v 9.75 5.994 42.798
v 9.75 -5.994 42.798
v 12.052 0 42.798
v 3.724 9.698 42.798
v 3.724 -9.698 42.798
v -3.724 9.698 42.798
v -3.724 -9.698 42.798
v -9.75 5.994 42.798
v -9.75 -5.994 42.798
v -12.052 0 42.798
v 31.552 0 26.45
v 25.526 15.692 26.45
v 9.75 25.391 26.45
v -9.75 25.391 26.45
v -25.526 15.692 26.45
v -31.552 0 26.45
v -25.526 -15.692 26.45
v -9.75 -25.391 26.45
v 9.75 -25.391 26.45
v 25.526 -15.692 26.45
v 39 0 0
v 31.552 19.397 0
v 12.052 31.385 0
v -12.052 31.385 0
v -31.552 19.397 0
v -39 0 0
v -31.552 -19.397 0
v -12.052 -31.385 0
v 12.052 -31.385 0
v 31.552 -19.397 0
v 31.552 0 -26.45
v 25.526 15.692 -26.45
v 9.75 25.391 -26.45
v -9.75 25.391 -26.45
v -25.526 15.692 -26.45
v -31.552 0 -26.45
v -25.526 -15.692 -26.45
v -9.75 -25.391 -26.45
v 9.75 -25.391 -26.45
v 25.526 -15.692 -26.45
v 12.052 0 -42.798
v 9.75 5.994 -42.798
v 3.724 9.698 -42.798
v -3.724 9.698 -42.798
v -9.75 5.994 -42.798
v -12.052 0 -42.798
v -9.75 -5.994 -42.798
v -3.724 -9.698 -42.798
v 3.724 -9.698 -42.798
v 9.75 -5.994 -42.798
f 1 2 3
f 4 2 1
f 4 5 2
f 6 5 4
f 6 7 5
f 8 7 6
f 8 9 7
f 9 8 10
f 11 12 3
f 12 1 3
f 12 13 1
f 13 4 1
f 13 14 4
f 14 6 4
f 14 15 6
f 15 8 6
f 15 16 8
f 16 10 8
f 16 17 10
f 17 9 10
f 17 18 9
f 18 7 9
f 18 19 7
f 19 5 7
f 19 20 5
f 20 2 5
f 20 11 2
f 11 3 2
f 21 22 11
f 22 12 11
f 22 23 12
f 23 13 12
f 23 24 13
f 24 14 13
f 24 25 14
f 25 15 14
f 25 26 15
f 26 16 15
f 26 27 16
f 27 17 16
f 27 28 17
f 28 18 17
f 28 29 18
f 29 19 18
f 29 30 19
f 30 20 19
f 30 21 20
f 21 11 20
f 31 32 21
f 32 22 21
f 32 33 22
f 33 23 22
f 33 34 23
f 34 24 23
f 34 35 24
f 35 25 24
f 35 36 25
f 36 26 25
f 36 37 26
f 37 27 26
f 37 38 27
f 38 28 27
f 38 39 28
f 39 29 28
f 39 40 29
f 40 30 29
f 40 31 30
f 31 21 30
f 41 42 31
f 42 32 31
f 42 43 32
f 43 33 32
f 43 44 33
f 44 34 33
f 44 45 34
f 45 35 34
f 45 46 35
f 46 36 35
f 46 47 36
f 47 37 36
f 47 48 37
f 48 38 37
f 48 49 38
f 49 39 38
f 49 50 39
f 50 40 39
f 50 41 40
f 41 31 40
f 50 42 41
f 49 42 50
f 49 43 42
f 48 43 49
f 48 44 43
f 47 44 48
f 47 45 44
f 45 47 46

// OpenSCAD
// Generated by SolidPython 1.0.1 on 2020-07-29 00:46:51


scale(v = [13, 11, 15]) {
	sphere(r = 3);
}
/***********************************************
*********      SolidPython code:      **********
************************************************
 
# import packages: SolidPython
from solid import *
from solid.utils import *
from itertools import chain, combinations, permutations


class Resize:

    def __init__(self, scad_file):
        self.scad_file = scad_file
        #self.scad_file = import_scad(scad_file)
        # cone/cylinder param:
        self.r1 = 0
        self.r2 = 0
        self.h = 0
        # rectangular prism param:
        self.w = 0
        self.l = 0
        # ellipse param:
        self.r = 0

    # import OpenScad code (file name corresponds to shape)


    # classify shape + parameters
    def assign(self, param1, param2, param3):
        if self.scad_file == 'cone.scad':
            self.r1 = param1
            self.r2 = param2
            self.h = param3
        elif self.scad_file == 'cylinder.scad':
            self.r1 = param1
            self.r2 = param2
            self.h = param3
        elif self.scad_file == 'rectangularPrism.scad':
            self.h = param1
            self.l = param2
            self.w = param3
        else:
            self.r = param1
            self.h = param2

    # resize parameters
    def iterate(self):
        x = range(3, 20, 2)
        i = 1
        if self.scad_file == 'cone.scad':
            tempList = list(permutations(x, 2))
            for temp in tempList:
                param1 = temp[0]
                param2 = temp[1]
                filepath = 'produced_scad_files/' + 'cone' + str(param1) + '_' + str(param2) + '_' + '.scad'
                scad_render_to_file(cylinder(h=param1, r1=param2, r2=0), filepath)

        elif self.scad_file == 'cylinder.scad':
            tempList = list(permutations(x, 3))
            for temp in tempList:
                param1 = temp[0]
                param2 = temp[1]
                filepath = 'produced_scad_files/' + 'cylinder' + str(param1) + '_' + str(param2) + '_' + '.scad'
                scad_render_to_file(cylinder(h=param1, r1=param2, r2=param2), filepath)

        elif self.scad_file == 'rectangularPrism.scad':
            tempList = list(permutations(x, 3))
            for temp in tempList:
                param1 = temp[0]
                param2 = temp[1]
                param3 = temp[2]
                filepath = 'produced_scad_files/' + 'rectangularPrism' + str(param1) + '_' + str(param2) + '_' + str(
                    param3) + '.scad'
                scad_render_to_file(cube(size=(param1, param2, param3)), filepath)

        elif self.scad_file == 'ellipse.scad':
            tempList = list(permutations(x, 4))
            for temp in tempList:
                param1 = temp[0]
                param2 = temp[1]
                param3 = temp[2]
                param4 = temp[3]
                filepath = 'produced_scad_files/' + 'ellipse' + str(param1) + '_' + str(param2) + '_' + str(param3) + '_' + str(param4) + '.scad'
                scad_render_to_file(scale([param1, param2, param3])(sphere(r=param4)), filepath)

    def render_to_scadfile(self):
        scad_render_to_file(scad, 'example.scad') 
 
************************************************/
